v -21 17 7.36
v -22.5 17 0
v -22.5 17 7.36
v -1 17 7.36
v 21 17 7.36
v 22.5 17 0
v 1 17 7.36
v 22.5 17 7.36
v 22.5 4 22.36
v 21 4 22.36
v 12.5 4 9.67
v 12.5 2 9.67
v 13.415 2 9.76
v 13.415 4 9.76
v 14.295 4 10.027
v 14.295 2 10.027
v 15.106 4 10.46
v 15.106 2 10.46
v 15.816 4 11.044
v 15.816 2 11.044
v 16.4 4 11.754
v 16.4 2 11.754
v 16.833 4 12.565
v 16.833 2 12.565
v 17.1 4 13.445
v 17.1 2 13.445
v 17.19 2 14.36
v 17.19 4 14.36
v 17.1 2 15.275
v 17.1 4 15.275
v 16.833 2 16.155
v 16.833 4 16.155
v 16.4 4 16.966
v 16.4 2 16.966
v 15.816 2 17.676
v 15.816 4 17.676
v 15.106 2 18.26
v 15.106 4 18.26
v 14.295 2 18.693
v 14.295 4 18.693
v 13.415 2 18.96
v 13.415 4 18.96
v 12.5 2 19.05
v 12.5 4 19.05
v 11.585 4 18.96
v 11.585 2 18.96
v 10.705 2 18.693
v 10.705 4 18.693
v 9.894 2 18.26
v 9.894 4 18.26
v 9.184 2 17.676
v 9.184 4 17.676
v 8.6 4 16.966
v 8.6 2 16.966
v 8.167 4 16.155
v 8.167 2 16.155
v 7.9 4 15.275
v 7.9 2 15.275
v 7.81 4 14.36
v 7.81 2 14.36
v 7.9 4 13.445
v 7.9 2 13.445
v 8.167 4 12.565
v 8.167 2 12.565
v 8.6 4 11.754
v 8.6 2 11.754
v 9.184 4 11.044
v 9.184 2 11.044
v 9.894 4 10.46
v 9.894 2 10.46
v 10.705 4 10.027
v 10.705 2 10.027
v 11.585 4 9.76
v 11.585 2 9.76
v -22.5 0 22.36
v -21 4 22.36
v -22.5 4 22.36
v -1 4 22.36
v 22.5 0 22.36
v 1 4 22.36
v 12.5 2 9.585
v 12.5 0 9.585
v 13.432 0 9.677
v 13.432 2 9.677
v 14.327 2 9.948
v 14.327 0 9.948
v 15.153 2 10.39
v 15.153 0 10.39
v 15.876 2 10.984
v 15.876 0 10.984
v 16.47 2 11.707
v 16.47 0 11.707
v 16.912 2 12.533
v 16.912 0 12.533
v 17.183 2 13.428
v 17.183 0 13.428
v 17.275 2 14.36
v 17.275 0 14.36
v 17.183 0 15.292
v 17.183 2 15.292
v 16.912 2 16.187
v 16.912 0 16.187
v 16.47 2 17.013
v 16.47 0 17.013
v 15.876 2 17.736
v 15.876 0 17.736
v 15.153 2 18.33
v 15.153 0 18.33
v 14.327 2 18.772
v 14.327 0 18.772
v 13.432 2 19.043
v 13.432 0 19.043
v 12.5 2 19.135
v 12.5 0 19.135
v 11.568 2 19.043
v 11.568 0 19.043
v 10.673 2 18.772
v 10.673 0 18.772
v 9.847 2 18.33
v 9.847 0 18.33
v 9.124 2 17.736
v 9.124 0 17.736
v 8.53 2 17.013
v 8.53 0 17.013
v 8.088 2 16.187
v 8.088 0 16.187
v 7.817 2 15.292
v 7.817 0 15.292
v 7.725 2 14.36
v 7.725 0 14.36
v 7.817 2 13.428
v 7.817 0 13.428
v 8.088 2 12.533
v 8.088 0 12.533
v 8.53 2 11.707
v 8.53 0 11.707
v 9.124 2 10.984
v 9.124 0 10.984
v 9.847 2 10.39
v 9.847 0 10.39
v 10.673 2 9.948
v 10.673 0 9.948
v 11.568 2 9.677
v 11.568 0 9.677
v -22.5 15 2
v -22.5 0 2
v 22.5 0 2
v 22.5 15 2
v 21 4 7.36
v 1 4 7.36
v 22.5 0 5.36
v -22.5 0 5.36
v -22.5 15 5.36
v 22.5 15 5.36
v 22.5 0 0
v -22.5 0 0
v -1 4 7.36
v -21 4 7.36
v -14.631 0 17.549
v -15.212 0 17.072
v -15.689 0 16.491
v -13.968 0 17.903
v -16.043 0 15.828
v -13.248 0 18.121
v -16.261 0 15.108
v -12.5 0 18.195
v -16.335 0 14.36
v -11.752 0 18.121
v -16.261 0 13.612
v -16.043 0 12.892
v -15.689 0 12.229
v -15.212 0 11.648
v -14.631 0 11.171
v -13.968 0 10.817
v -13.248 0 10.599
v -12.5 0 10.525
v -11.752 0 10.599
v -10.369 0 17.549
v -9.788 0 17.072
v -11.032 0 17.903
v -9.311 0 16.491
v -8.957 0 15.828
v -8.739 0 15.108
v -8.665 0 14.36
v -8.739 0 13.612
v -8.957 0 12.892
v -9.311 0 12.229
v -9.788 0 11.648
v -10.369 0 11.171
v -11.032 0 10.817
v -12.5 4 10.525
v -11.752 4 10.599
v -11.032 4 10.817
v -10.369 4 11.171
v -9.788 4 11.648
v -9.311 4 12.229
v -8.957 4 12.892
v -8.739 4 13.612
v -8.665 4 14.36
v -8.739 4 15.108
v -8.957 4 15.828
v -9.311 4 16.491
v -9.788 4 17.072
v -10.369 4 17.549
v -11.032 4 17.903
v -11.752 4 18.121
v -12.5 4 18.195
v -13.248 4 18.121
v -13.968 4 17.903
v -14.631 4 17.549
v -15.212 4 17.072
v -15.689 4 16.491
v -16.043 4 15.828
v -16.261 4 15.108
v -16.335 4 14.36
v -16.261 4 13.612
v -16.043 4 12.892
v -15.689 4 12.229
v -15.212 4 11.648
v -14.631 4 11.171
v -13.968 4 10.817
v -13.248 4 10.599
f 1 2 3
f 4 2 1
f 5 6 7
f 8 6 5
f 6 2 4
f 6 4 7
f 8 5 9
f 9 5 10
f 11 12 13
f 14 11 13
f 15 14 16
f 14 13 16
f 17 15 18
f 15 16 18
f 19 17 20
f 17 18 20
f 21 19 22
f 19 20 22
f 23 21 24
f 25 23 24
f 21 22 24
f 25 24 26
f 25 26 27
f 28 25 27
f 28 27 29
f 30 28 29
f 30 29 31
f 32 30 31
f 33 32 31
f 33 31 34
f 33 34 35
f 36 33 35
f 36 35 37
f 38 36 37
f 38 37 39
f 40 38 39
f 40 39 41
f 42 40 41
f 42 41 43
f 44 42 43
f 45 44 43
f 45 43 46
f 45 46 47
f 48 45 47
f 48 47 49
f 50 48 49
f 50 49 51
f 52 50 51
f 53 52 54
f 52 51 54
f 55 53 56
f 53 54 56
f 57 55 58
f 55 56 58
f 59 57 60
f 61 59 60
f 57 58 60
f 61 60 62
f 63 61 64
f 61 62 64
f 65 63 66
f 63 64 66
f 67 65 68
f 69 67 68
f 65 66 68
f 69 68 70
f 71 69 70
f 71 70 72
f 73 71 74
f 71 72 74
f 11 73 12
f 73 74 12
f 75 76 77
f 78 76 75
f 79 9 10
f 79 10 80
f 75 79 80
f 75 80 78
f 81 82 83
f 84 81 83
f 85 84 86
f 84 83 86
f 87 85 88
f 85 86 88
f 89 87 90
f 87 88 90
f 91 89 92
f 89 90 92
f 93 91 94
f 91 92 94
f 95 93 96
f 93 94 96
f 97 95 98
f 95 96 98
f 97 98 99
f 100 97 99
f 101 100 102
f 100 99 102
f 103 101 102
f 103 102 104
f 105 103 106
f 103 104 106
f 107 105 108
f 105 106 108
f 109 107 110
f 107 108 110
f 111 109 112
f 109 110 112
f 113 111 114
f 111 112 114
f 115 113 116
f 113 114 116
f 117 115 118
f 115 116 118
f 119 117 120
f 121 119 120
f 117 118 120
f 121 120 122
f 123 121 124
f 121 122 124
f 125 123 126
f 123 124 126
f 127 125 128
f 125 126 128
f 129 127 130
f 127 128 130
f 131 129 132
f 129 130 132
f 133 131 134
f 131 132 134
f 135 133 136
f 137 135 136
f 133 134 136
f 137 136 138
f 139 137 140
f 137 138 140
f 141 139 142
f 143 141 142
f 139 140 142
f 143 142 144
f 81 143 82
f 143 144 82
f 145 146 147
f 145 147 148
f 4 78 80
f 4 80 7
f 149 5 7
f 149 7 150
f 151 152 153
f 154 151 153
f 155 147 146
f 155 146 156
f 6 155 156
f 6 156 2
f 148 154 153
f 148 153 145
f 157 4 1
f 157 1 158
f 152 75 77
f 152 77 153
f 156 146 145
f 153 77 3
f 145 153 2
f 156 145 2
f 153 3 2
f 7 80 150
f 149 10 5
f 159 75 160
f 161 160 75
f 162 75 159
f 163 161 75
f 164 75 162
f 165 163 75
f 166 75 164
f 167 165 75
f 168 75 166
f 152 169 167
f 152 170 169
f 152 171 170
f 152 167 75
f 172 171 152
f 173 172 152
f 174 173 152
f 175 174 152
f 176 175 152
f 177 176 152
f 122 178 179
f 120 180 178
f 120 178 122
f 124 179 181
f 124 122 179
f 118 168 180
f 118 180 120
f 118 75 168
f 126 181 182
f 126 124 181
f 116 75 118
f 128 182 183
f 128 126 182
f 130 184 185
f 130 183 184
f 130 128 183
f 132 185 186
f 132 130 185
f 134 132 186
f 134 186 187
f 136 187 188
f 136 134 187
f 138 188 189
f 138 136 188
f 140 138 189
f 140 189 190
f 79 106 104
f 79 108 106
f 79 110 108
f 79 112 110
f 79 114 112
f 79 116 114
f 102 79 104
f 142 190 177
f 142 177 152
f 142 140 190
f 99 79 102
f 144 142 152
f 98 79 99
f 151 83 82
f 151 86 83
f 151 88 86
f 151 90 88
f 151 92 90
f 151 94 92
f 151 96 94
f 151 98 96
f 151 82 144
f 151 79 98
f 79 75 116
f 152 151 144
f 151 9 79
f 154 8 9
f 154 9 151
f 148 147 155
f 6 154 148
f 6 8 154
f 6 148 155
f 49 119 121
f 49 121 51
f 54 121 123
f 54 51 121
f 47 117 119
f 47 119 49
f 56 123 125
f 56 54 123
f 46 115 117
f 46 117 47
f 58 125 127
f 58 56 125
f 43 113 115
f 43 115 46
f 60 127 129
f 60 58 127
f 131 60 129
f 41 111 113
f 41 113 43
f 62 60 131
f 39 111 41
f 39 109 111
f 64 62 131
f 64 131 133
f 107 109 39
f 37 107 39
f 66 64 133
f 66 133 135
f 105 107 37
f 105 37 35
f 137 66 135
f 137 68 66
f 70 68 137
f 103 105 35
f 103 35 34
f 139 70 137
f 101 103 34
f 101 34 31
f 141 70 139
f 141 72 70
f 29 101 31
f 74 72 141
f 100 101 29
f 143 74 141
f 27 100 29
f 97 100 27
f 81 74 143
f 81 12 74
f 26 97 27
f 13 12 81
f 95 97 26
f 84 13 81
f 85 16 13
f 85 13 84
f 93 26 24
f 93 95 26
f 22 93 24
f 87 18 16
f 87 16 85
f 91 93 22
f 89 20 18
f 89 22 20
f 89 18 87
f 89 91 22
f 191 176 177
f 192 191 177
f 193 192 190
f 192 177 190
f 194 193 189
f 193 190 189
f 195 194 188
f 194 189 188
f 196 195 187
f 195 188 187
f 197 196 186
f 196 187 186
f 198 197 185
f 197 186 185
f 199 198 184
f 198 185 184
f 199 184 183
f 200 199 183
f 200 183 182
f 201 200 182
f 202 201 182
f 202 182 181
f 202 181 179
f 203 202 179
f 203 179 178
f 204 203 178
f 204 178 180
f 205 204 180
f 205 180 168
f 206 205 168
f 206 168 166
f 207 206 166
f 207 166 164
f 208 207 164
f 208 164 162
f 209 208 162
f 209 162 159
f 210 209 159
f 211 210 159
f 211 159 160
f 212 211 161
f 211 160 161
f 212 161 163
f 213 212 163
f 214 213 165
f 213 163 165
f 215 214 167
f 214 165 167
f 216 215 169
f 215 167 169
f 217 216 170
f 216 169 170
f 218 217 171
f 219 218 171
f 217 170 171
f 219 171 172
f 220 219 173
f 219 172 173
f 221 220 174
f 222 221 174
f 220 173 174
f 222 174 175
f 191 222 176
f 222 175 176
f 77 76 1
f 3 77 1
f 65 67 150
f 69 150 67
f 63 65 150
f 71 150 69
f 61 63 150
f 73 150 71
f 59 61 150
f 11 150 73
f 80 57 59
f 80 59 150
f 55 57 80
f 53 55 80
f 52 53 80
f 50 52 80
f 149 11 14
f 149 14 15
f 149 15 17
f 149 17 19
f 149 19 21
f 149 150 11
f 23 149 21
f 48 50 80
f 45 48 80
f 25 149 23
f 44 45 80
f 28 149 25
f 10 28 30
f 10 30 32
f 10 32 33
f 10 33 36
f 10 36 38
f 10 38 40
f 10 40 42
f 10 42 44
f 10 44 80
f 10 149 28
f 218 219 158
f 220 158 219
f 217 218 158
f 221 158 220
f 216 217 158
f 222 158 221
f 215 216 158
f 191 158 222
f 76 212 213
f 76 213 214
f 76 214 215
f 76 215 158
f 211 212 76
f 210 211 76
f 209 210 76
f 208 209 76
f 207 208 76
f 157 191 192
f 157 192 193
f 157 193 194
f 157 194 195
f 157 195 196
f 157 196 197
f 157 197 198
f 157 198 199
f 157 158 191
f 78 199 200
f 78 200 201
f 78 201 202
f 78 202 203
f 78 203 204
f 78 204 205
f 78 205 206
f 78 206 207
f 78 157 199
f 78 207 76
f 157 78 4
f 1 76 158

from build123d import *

# Parameters (mm, degrees)
BOSS_EXTRUDE1_DEPTH = 22.5
SKETCH2_W           = 3.36
SKETCH2_H           = 28
CUT_EXTRUDE1_DEPTH  = 54.046862301
SKETCH3_W           = 7.36
SKETCH3_H           = 13
CUT_EXTRUDE2_DEPTH  = 54.046862301
SKETCH4_R           = 4.69
SKETCH4_R_2         = 3.835
CUT_EXTRUDE3_DEPTH  = 10
SKETCH6_R           = 4.775
CUT_EXTRUDE5_DEPTH  = 2
RIB2_REACH          = 55.047
SKETCH7_WALL_W      = 127.943157844
SKETCH7_WALL_H      = 1.5
RIB3_REACH          = 55.047
SKETCH8_WALL_W      = 127.943157844
SKETCH8_WALL_H      = 1.5
RIB4_REACH          = 37.989
SKETCH9_WALL_W      = 93.8277522
SKETCH9_WALL_H      = 2


with BuildPart() as part:
    # Sketch1 → Boss-Extrude1 (new, symmetric)
    with BuildSketch(Plane(origin=(0, 0, 0), x_dir=(0, 0, -1), z_dir=(1, 0, 0))):
        Polygon((0, -13), (0, 17), (-7.36, 17), (-7.36, 4), (-22.36, 4), (-22.36, 0), (-7.36, 0), (-7.36, -13), align=None)
    extrude(amount=BOSS_EXTRUDE1_DEPTH, both=True)

    # Sketch2 → Cut-Extrude1 (cut, through all)
    with BuildSketch(Plane(origin=(22.5, 0, 0), x_dir=(0, 0, -1), z_dir=(1, 0, 0))):
        with Locations((-3.68, 1)):
            Rectangle(SKETCH2_W, SKETCH2_H)
    extrude(amount=-CUT_EXTRUDE1_DEPTH, mode=Mode.SUBTRACT)

    # Sketch3 → Cut-Extrude2 (cut, through all)
    with BuildSketch(Plane(origin=(22.5, 0, 0), x_dir=(0, 0, -1), z_dir=(1, 0, 0))):
        with Locations((-3.68, -6.5)):
            Rectangle(SKETCH3_W, SKETCH3_H)
    extrude(amount=-CUT_EXTRUDE2_DEPTH, mode=Mode.SUBTRACT)

    # Sketch4 → Cut-Extrude3 (cut)
    with BuildSketch(Plane(origin=(0, 0, 0), x_dir=(-1, 0, 0), z_dir=(0, -1, 0))):
        with Locations((-12.5, -14.36)):
            Circle(SKETCH4_R)
        with Locations((12.5, -14.36)):
            Circle(SKETCH4_R_2)
    extrude(amount=-CUT_EXTRUDE3_DEPTH, mode=Mode.SUBTRACT)

    # Sketch6 → Cut-Extrude5 (cut)
    with BuildSketch(Plane(origin=(0, 0, 0), x_dir=(-1, 0, 0), z_dir=(0, -1, 0))):
        with Locations((-12.5, -14.36)):
            Circle(SKETCH6_R)
    extrude(amount=-CUT_EXTRUDE5_DEPTH, mode=Mode.SUBTRACT)

    # Sketch7 wall → Rib2 (add, up to next)
    with BuildSketch(Plane(origin=(-22.5, 10.5, 14.86), x_dir=(0, 0.654930538418, -0.75568908279), z_dir=(0, -0.75568908279, -0.654930538418)), mode=Mode.PRIVATE) as rib2_sk1:
        with Locations((0, 0.75)):
            Rectangle(SKETCH7_WALL_W, SKETCH7_WALL_H)
    rib2_tool1 = extrude(rib2_sk1.sketch, amount=RIB2_REACH, mode=Mode.PRIVATE) - part.part
    add(rib2_tool1.solids().sort_by_distance((-22.5, 10.5, 14.86))[0])

    # Sketch8 wall → Rib3 (add, up to next)
    with BuildSketch(Plane(origin=(22.5, 10.5, 14.86), x_dir=(0, 0.654930538418, -0.75568908279), z_dir=(0, 0.75568908279, 0.654930538418)), mode=Mode.PRIVATE) as rib3_sk1:
        with Locations((0, 0.75)):
            Rectangle(SKETCH8_WALL_W, SKETCH8_WALL_H)
    rib3_tool1 = extrude(rib3_sk1.sketch, amount=-RIB3_REACH, mode=Mode.PRIVATE) - part.part
    add(rib3_tool1.solids().sort_by_distance((22.5, 10.5, 14.86))[0])

    # Sketch9 wall → Rib4 (add, up to next)
    with BuildSketch(Plane(origin=(0, 10.5, 14.86), x_dir=(0, 0.654930538418, -0.75568908279), z_dir=(0, 0.75568908279, 0.654930538418)), mode=Mode.PRIVATE) as rib4_sk1:
        Rectangle(SKETCH9_WALL_W, SKETCH9_WALL_H)
    rib4_tool1 = extrude(rib4_sk1.sketch, amount=-RIB4_REACH, mode=Mode.PRIVATE) - part.part
    add(rib4_tool1.solids().sort_by_distance((0, 10.5, 14.86))[0])


solid = part.part
